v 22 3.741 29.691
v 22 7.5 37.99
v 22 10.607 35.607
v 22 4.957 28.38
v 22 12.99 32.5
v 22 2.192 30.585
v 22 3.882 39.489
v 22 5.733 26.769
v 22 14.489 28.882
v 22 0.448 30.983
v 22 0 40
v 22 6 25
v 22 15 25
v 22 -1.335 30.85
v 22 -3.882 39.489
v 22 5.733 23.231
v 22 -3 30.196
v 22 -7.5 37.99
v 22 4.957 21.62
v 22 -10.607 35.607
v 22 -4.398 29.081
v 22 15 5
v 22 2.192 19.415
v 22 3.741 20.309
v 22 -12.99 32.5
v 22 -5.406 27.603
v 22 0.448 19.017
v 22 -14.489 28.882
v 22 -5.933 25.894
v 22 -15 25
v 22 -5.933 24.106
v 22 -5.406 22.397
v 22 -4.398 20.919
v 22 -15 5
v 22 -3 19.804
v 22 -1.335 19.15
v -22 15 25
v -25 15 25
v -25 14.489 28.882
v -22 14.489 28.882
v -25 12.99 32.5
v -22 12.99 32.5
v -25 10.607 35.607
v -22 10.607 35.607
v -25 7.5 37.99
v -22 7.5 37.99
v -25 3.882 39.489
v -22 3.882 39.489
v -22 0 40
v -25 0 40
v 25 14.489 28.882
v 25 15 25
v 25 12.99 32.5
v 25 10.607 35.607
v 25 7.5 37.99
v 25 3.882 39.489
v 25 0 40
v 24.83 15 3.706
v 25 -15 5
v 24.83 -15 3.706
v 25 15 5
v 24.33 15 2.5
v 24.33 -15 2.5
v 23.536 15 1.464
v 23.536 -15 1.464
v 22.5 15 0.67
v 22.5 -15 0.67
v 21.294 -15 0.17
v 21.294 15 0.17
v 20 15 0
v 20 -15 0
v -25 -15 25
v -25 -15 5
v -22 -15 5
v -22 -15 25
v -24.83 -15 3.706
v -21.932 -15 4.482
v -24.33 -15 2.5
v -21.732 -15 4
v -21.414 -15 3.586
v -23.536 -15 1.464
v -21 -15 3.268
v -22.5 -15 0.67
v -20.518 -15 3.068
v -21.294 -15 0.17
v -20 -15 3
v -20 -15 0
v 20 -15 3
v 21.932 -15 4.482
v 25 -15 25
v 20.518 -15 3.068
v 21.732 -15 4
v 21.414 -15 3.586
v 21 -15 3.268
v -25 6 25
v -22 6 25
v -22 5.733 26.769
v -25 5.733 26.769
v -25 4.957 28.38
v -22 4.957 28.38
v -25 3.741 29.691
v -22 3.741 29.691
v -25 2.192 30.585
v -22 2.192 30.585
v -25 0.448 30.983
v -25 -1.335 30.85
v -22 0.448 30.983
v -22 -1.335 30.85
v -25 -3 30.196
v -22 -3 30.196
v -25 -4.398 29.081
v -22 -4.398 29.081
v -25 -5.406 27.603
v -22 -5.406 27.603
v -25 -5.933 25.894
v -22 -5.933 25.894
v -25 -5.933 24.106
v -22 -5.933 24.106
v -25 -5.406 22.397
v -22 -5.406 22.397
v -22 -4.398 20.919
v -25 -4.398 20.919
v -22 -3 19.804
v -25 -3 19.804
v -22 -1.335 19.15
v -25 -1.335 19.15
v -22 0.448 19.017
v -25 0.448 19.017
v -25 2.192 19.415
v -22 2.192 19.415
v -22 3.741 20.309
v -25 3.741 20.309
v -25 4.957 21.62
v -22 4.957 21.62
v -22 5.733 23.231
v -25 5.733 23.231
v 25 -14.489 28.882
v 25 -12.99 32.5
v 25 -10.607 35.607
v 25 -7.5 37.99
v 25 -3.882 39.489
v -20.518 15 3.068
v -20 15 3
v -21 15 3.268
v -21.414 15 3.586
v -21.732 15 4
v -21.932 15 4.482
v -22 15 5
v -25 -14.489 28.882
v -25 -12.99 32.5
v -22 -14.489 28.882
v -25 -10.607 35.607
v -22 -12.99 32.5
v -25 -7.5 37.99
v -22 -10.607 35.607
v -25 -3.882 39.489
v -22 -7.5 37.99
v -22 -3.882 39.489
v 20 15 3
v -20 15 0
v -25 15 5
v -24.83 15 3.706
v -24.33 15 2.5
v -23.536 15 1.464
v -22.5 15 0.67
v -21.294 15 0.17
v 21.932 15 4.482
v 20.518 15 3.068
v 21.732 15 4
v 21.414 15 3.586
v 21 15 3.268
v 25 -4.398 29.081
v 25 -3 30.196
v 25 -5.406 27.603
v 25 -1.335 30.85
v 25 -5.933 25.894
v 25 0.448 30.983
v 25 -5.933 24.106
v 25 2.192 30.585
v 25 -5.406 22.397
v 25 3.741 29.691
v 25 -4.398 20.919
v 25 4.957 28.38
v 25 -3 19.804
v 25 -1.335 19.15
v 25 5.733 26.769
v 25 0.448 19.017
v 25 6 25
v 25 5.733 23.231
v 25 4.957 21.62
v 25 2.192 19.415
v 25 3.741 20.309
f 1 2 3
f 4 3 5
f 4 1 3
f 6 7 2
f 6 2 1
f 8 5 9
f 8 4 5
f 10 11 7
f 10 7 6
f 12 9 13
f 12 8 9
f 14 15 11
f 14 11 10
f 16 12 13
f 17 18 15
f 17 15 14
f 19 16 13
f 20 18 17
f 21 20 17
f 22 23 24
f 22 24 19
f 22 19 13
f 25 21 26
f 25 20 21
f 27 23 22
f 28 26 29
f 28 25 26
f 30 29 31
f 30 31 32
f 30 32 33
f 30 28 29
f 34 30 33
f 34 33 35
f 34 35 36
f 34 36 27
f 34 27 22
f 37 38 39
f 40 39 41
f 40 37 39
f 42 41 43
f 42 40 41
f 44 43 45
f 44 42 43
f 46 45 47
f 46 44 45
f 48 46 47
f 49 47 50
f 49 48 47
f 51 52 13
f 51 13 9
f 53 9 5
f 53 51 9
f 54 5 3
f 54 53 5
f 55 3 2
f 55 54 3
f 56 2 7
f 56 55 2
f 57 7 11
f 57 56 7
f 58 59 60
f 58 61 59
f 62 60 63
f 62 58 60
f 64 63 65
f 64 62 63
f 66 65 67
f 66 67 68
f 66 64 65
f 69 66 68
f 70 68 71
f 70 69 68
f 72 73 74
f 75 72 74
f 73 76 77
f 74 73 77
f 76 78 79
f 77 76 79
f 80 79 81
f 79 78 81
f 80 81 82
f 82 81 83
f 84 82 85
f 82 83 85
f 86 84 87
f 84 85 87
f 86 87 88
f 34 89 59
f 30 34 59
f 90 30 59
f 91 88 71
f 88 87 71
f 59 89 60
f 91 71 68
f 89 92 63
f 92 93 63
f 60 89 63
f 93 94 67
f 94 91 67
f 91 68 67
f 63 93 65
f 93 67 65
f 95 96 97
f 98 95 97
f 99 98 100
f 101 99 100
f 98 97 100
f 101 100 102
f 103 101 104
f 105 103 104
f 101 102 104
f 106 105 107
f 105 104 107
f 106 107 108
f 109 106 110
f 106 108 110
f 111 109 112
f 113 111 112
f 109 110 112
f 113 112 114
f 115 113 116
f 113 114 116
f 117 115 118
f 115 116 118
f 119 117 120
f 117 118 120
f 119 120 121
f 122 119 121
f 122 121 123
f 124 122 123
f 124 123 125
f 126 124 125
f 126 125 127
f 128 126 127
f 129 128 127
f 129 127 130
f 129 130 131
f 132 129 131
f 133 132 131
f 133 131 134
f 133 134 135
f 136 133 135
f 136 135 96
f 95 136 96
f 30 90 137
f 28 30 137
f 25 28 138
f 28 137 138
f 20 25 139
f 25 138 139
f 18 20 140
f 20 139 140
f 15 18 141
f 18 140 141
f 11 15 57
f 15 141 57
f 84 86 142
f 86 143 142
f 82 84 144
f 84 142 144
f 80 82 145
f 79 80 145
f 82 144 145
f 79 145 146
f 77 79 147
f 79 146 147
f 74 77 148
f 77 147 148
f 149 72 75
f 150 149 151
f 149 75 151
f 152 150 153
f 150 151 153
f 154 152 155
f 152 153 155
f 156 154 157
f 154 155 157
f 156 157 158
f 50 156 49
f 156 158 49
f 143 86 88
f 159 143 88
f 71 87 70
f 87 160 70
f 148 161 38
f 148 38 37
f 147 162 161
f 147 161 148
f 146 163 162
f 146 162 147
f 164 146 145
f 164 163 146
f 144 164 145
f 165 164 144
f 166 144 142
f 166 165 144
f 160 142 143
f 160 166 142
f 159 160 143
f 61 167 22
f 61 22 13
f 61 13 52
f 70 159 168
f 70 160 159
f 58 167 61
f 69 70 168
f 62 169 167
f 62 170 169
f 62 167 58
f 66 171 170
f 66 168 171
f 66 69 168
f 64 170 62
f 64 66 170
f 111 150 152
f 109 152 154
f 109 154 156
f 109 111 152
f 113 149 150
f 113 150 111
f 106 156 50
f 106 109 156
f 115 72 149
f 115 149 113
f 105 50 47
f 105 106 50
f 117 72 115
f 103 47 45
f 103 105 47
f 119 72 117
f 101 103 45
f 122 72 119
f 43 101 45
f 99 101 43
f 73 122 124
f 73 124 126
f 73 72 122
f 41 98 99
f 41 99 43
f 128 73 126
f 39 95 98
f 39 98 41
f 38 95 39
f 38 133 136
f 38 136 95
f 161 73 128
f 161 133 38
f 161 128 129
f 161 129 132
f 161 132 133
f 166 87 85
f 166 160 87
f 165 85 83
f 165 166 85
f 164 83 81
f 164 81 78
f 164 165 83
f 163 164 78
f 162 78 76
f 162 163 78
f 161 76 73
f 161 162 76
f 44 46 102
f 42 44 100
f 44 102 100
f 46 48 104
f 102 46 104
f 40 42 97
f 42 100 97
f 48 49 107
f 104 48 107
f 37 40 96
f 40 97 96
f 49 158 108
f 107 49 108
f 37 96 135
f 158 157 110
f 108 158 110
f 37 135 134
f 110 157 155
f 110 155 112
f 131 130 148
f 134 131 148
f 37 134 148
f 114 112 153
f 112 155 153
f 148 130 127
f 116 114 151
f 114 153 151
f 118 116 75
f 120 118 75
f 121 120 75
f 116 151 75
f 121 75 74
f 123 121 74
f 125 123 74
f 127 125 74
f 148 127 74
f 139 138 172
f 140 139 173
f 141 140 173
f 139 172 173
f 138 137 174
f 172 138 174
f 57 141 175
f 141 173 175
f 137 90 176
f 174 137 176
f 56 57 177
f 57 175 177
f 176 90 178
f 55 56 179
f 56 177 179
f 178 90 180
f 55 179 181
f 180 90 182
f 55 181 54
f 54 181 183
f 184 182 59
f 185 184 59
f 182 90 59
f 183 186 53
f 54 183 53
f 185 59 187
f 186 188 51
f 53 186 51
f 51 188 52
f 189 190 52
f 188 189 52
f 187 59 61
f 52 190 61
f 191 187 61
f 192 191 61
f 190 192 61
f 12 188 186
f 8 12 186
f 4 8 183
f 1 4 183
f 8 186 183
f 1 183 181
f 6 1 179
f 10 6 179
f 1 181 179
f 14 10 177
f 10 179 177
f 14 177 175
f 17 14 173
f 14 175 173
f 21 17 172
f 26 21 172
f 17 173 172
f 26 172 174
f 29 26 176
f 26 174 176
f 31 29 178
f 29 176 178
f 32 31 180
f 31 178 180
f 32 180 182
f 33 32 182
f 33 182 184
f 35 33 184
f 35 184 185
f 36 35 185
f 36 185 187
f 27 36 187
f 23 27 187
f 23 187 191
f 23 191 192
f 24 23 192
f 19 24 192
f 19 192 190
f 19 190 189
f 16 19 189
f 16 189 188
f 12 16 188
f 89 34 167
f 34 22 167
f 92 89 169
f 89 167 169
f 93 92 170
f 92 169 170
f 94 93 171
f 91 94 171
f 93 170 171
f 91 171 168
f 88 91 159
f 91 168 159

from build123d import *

# Parameters (mm, degrees)
SKICA1_W                      = 50
SKICA1_H                      = 30
P_IDAT_VYSUNUT_M1_DEPTH       = 40
ZAOBLIT1_R                    = 15
ODEBRAT_VYSUNUT_M1_DEPTH      = 50.497474683
ODEBRAT_VYSUNUT_M1_DEPTH_BACK = 50.497474683
SKICA2_W                      = 44
SKICA2_H                      = 50
ZAOBLIT2_R                    = 2
ZAOBLIT3_R                    = 5
SKICA3_R                      = 6
ODEBRAT_VYSUNUT_M2_DEPTH      = 66.76473219


with BuildPart() as part:
    # Skica1 → Přidat vysunutím1 (new body)
    with BuildSketch(Plane.XY):
        Rectangle(SKICA1_W, SKICA1_H)
    extrude(amount=P_IDAT_VYSUNUT_M1_DEPTH)

    # Zaoblit1
    zaoblit1_edges = [part.edges().sort_by_distance(p)[0] for p in [
        (0, -15, 40),
        (0, 15, 40),
    ]]
    fillet(zaoblit1_edges, radius=ZAOBLIT1_R - 0.0001)  # a hair under: the kernel refuses the full size

    # Skica2 → Odebrat vysunutím1 (cut, two sides: drawn at the far end of the back side and taken through both)
    with BuildSketch(Plane(origin=(0, 0, 0), x_dir=(1, 0, 0), z_dir=(0, 1, 0)).offset(-ODEBRAT_VYSUNUT_M1_DEPTH_BACK)):
        with Locations((0, -28)):
            Rectangle(SKICA2_W, SKICA2_H)
    extrude(amount=ODEBRAT_VYSUNUT_M1_DEPTH + ODEBRAT_VYSUNUT_M1_DEPTH_BACK, mode=Mode.SUBTRACT)

    # Zaoblit2
    zaoblit2_edges = [part.edges().sort_by_distance(p)[0] for p in [
        (-22, 0, 3),
        (22, 0, 3),
    ]]
    fillet(zaoblit2_edges, radius=ZAOBLIT2_R)

    # Zaoblit3
    zaoblit3_edges = [part.edges().sort_by_distance(p)[0] for p in [
        (25, 0, 0),
        (-25, 0, 0),
    ]]
    fillet(zaoblit3_edges, radius=ZAOBLIT3_R)

    # Skica3 → Odebrat vysunutím2 (cut, through all)
    with BuildSketch(Plane(origin=(25, 0, 0), x_dir=(0, 0, -1), z_dir=(1, 0, 0))):
        with Locations(Location((-25, 0, 0), (0, 0, 90))):
            Circle(SKICA3_R)
    extrude(amount=-ODEBRAT_VYSUNUT_M2_DEPTH, mode=Mode.SUBTRACT)


solid = part.part
